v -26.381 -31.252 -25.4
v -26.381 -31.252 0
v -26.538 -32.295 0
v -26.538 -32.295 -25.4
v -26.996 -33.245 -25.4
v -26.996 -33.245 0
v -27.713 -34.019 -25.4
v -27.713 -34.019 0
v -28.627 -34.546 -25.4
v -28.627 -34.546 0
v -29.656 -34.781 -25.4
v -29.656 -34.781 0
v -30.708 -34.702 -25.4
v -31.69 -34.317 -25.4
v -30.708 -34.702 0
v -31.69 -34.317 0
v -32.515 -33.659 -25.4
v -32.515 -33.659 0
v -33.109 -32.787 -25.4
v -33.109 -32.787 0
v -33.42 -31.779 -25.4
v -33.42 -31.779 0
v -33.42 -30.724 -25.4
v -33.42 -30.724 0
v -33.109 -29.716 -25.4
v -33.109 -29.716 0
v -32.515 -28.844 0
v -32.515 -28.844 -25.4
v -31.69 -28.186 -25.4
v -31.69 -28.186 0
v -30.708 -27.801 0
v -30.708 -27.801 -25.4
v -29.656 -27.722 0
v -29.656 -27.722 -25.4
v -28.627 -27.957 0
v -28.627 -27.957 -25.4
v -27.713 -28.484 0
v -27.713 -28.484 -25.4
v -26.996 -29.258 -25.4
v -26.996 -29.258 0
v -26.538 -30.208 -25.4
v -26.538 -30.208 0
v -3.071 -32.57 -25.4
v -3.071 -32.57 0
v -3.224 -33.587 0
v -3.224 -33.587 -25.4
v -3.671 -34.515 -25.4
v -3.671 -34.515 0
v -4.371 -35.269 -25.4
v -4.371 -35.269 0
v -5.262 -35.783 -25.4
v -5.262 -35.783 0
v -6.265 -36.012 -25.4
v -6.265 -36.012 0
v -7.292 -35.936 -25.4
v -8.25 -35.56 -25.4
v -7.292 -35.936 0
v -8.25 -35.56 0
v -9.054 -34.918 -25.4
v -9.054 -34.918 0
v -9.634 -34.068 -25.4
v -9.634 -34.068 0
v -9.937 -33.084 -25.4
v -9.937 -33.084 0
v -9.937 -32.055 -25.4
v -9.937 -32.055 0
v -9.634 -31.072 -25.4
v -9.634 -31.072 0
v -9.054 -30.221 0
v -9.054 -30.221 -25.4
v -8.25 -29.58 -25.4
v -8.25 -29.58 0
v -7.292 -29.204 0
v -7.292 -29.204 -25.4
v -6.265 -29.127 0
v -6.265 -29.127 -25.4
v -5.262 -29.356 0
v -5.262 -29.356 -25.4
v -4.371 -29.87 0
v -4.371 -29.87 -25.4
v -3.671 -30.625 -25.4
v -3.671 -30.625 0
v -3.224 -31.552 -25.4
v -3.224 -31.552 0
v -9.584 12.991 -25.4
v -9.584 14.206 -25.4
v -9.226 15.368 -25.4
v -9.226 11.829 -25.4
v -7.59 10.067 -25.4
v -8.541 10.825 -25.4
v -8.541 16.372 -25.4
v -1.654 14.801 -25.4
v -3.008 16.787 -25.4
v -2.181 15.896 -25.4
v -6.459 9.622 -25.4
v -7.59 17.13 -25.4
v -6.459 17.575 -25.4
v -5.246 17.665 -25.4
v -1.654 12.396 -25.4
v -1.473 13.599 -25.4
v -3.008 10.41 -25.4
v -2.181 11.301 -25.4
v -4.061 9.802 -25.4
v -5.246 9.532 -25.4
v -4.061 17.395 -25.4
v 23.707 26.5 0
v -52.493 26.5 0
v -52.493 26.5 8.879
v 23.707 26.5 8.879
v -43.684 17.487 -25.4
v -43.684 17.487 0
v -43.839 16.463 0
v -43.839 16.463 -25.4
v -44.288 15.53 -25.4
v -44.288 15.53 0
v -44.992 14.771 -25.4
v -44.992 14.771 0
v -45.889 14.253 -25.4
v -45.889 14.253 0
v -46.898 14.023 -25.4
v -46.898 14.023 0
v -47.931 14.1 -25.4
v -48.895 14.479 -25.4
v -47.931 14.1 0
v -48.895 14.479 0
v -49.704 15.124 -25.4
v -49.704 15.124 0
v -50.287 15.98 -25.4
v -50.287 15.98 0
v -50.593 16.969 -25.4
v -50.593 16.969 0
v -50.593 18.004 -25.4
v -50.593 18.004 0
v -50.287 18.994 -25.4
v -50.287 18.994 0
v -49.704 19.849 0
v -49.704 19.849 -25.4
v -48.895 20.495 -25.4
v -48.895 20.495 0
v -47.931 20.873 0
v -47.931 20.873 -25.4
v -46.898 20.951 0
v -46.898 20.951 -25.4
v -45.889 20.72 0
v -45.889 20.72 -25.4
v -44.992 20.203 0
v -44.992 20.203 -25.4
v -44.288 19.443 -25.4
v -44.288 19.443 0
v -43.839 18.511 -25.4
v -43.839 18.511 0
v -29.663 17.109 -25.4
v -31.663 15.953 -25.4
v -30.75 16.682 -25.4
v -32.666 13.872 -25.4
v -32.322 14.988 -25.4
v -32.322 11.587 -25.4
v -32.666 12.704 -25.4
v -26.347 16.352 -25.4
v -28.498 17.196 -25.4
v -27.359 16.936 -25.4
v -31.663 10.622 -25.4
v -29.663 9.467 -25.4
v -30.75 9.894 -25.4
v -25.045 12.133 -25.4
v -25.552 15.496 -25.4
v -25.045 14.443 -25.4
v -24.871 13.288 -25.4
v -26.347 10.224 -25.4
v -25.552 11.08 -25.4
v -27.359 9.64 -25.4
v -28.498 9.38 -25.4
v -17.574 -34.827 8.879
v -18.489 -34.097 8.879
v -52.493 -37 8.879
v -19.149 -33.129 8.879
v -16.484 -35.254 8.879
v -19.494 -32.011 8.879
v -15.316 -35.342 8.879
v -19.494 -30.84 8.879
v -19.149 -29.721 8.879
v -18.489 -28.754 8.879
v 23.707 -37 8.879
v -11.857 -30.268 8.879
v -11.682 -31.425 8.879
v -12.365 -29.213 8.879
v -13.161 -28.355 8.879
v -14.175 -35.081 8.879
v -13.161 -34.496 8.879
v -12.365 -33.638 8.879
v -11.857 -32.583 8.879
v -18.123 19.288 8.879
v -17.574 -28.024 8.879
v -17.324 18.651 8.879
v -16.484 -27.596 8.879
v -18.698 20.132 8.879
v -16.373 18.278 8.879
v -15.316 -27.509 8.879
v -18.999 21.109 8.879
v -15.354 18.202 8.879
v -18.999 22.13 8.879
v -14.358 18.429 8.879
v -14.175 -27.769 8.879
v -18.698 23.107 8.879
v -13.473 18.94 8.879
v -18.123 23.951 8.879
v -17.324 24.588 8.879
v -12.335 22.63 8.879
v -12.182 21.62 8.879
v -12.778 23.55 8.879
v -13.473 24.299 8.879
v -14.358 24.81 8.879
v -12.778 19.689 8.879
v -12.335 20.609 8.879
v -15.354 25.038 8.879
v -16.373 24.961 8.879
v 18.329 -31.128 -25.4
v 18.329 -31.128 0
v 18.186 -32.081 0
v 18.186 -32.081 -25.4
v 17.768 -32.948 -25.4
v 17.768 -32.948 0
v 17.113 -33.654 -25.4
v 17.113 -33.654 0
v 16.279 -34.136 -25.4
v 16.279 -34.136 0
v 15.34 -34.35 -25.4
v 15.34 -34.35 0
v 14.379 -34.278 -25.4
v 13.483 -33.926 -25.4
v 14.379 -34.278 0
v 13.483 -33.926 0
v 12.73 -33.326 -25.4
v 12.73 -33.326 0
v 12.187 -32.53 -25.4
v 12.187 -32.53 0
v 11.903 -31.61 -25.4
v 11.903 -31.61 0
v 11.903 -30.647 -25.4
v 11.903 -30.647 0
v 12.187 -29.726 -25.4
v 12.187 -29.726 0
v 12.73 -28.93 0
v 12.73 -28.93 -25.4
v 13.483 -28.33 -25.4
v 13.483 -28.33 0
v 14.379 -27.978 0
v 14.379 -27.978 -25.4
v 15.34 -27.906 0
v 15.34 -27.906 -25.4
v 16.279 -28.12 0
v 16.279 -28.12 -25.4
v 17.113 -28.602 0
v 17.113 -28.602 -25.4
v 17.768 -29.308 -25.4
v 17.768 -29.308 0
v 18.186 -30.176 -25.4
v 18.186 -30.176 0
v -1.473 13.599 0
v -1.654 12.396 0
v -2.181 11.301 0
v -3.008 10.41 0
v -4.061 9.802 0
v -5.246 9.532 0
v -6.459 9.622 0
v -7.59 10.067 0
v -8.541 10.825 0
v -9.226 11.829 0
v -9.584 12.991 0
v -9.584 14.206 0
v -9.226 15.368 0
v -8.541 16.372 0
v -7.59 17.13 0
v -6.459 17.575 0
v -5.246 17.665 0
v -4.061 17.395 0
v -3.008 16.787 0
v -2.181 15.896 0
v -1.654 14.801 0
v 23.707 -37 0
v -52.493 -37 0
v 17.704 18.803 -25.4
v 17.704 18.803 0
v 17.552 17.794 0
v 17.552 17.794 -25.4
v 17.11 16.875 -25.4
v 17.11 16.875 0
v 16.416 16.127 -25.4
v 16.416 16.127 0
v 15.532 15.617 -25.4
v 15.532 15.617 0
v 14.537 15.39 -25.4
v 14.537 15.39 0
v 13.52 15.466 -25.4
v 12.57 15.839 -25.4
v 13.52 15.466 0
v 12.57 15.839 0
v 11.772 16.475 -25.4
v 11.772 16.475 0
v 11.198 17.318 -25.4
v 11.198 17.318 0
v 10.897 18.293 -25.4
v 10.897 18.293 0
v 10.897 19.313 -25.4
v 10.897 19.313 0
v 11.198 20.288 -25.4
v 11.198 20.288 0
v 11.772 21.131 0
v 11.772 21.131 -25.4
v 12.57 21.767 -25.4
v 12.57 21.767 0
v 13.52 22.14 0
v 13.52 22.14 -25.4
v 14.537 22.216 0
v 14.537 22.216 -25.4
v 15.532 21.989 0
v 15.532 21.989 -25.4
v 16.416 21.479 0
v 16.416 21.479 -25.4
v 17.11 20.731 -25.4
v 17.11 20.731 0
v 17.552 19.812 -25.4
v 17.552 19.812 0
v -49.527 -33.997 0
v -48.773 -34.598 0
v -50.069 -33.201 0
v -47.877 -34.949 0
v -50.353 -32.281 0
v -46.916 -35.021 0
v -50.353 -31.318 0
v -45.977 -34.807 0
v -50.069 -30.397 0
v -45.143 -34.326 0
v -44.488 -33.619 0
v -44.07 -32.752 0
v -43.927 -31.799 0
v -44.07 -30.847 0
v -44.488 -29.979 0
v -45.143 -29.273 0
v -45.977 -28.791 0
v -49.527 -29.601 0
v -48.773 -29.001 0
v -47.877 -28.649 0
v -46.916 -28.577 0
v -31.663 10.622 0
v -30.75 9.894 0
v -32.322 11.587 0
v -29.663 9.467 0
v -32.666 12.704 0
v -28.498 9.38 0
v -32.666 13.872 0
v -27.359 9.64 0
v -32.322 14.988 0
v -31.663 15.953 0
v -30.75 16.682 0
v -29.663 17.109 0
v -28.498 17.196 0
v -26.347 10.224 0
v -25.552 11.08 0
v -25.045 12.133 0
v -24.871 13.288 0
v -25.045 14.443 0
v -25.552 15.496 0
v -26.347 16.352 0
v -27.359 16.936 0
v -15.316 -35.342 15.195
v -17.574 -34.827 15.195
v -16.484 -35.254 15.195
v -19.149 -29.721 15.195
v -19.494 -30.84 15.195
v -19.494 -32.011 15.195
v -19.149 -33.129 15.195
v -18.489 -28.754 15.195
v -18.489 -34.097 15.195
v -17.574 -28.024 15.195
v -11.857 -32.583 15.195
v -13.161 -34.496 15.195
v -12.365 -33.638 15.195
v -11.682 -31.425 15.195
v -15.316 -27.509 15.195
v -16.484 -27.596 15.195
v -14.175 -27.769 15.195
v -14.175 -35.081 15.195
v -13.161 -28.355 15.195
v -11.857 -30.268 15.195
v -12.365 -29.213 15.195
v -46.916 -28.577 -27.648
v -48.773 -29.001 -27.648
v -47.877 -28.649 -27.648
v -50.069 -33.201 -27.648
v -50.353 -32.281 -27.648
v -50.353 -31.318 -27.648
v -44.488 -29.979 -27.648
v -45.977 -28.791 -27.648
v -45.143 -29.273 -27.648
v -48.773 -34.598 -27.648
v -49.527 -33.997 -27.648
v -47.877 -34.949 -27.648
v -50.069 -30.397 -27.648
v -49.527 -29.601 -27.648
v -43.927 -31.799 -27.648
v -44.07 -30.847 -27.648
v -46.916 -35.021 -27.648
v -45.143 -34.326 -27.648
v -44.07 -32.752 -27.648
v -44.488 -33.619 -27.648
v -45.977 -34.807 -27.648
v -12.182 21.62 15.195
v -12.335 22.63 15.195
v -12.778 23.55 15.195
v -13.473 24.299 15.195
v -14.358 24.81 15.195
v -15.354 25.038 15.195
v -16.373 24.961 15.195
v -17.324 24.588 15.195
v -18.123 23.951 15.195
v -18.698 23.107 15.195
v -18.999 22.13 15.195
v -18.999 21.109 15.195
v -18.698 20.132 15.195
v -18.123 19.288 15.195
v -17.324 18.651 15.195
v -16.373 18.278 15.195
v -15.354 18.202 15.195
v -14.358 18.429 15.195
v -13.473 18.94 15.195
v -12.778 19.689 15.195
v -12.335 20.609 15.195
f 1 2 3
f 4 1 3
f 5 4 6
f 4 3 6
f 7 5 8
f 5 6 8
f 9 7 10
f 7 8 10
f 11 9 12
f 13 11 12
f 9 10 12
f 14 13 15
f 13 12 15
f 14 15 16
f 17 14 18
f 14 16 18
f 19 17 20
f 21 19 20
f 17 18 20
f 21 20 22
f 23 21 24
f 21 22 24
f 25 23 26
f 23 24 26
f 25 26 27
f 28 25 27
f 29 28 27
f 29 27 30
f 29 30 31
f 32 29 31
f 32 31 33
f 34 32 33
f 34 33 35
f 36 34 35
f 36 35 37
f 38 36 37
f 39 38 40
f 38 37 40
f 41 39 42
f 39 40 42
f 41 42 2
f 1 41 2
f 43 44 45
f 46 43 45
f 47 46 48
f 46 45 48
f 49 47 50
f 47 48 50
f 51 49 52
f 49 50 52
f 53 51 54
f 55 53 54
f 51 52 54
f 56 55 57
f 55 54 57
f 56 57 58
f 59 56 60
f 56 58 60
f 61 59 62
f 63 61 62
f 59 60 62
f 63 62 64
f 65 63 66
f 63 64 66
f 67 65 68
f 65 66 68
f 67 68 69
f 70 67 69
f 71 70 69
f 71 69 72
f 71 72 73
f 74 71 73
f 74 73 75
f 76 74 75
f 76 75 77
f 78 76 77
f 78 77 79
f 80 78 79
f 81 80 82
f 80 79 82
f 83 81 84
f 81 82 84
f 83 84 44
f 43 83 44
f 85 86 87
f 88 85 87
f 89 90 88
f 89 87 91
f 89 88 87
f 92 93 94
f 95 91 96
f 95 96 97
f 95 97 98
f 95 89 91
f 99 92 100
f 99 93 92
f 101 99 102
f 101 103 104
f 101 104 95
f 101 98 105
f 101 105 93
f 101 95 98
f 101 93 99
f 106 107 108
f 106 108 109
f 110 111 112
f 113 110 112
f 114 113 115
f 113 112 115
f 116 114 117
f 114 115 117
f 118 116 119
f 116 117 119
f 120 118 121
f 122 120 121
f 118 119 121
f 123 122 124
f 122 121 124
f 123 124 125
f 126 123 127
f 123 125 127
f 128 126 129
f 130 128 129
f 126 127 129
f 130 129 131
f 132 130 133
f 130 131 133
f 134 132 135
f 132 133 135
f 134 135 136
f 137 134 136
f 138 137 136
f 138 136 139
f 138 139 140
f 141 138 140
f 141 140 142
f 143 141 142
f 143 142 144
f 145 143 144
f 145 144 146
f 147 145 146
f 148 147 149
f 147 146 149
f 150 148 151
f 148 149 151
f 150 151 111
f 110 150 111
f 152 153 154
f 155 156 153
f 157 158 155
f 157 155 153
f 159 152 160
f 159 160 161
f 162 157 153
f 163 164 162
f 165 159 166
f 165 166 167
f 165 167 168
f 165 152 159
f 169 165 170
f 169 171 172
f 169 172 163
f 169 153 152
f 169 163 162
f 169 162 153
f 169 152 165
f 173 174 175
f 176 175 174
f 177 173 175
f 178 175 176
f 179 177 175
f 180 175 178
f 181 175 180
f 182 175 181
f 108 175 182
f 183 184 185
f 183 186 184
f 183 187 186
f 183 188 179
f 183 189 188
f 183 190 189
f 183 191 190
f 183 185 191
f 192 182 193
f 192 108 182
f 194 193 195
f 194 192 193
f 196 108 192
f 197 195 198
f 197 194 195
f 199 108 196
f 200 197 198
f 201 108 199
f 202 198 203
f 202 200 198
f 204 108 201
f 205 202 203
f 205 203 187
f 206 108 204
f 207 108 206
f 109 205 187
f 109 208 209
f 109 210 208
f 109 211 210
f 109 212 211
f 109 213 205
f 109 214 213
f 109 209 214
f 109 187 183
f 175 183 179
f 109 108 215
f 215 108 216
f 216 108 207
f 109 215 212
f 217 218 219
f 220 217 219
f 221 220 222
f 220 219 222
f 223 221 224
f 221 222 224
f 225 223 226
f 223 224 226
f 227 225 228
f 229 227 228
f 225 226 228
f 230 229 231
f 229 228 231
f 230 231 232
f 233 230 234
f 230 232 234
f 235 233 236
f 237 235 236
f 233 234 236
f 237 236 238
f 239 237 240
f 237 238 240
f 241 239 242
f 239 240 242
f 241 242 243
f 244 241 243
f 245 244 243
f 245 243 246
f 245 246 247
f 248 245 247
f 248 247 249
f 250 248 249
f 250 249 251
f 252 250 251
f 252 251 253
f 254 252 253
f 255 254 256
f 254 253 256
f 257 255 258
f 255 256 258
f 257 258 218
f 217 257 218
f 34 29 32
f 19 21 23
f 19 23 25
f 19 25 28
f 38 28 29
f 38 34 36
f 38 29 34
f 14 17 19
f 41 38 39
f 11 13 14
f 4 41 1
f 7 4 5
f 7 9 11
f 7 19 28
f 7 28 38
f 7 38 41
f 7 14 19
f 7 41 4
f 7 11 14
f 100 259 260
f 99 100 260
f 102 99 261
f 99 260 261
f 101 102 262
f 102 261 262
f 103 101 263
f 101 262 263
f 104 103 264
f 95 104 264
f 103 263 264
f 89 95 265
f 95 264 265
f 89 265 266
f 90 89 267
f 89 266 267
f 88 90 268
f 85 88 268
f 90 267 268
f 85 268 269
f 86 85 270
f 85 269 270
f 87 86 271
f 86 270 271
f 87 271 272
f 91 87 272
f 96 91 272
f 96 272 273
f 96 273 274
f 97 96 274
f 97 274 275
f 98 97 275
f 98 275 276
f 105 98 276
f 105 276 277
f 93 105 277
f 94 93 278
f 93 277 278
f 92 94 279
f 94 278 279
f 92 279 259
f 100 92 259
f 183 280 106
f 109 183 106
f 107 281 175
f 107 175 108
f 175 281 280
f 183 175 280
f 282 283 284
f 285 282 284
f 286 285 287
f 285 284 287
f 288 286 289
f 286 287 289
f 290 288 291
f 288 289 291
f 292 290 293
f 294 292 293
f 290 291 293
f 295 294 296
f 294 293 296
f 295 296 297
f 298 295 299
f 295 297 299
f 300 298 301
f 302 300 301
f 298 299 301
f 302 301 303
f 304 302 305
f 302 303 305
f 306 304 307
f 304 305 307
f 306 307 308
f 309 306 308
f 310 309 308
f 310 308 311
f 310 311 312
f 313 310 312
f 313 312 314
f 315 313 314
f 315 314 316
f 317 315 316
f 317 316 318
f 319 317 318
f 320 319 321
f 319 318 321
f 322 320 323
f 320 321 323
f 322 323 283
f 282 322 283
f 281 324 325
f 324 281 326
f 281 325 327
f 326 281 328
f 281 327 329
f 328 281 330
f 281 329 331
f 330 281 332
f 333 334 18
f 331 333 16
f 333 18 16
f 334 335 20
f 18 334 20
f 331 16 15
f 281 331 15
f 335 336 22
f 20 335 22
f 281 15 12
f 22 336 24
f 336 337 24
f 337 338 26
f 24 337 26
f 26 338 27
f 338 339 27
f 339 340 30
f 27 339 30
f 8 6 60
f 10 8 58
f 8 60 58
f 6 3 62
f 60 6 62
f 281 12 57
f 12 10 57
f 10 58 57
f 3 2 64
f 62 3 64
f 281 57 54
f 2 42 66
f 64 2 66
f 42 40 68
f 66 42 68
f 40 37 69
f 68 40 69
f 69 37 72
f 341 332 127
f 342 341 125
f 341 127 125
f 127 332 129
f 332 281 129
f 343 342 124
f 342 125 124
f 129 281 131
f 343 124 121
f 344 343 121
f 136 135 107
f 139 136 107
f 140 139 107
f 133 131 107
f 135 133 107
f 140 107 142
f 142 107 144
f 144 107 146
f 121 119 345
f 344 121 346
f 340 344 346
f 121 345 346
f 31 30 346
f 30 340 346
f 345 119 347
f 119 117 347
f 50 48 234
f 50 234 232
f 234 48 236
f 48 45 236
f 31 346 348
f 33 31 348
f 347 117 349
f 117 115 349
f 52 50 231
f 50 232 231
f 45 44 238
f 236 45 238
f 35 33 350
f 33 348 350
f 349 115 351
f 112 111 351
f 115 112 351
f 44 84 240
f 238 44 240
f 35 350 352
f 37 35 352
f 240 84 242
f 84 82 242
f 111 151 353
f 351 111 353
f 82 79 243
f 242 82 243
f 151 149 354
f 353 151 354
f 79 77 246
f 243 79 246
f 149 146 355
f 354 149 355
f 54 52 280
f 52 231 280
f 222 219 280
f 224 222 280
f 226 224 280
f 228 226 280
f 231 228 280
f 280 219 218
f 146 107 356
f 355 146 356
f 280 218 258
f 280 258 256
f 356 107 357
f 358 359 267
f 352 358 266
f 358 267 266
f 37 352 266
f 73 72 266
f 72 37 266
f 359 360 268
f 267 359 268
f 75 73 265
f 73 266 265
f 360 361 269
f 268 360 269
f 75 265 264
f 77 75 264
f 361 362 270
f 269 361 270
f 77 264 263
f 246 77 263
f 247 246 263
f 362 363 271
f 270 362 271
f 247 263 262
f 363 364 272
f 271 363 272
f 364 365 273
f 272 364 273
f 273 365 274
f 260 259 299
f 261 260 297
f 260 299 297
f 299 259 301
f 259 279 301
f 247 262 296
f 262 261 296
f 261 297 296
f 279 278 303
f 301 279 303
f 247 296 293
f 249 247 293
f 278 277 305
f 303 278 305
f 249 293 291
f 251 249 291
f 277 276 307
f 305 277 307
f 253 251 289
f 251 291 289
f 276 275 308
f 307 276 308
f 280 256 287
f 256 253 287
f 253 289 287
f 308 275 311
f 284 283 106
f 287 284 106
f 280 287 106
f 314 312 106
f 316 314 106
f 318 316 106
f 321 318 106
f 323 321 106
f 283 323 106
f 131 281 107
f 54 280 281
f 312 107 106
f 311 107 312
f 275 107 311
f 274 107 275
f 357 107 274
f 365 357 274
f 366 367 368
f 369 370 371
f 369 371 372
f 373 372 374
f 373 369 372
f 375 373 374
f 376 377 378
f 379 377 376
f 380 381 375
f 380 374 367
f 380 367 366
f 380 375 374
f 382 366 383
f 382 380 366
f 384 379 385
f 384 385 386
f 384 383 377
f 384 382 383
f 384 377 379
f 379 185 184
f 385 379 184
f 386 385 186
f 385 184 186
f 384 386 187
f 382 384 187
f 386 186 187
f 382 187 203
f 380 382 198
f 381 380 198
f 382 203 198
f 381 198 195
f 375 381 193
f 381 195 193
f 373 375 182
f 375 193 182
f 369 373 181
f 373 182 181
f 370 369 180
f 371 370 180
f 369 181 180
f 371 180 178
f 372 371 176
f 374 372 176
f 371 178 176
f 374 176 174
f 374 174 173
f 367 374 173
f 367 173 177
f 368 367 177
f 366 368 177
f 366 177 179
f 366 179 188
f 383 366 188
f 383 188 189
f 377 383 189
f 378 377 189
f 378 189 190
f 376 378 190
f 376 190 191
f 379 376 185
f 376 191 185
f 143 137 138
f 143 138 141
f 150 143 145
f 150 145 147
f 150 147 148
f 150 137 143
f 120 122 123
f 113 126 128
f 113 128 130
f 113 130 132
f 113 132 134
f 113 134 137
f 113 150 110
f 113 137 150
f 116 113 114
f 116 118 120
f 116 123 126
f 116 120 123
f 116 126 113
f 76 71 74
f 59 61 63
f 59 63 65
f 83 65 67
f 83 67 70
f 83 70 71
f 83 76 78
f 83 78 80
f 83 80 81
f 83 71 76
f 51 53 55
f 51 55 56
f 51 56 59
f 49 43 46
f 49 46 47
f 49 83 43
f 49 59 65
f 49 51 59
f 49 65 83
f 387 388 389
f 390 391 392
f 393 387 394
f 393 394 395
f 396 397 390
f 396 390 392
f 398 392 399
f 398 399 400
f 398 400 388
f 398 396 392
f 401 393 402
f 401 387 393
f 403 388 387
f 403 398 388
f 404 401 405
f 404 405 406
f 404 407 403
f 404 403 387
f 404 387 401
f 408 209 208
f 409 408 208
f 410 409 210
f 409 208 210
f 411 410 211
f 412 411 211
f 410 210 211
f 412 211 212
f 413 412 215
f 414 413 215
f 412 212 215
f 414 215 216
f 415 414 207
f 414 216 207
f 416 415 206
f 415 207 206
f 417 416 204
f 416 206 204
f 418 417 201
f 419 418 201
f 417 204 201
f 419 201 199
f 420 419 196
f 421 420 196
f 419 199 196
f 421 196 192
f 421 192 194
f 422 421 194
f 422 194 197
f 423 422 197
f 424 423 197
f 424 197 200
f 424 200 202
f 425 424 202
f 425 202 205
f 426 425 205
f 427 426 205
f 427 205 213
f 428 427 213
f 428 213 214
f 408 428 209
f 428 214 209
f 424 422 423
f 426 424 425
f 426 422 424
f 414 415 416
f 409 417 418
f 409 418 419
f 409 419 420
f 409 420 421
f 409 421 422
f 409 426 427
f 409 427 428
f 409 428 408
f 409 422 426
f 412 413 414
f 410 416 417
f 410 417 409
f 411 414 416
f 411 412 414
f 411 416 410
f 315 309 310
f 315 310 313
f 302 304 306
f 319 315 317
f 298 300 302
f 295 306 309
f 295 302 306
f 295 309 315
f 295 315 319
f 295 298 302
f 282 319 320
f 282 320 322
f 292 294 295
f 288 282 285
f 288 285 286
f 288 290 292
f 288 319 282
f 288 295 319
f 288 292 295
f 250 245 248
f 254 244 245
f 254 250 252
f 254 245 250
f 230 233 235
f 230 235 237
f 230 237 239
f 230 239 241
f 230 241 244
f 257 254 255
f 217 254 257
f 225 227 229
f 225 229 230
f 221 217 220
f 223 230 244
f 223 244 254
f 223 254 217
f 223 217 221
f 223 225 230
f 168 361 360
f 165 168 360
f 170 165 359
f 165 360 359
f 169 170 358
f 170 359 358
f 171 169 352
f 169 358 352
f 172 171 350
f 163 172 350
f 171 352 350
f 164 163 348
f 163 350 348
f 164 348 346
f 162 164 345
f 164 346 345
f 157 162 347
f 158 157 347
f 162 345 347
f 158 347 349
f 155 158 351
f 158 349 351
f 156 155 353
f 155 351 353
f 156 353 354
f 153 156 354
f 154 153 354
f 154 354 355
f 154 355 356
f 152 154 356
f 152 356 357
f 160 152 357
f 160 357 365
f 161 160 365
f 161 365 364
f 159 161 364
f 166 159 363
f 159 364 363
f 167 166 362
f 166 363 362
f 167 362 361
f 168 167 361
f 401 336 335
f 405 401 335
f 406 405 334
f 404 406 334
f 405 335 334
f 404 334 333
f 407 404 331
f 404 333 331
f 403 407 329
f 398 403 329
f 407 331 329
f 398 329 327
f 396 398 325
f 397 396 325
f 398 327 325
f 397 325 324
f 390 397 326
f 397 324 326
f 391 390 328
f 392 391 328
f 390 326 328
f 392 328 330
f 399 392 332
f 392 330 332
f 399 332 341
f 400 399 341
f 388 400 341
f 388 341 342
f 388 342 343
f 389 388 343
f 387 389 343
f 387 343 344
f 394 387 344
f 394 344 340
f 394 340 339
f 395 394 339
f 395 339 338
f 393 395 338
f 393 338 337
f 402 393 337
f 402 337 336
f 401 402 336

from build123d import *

# Parameters (mm, degrees)
F0_W      = 76.2
F0_H      = 63.5
F1_DEPTH  = 8.87915
F2_R      = 3.2312727432
F3_DEPTH  = 27.64789
F2_R_2    = 3.4736024705
F2_R_3    = 3.4228960701
F2_R_4    = 3.2312730123
F4_DEPTH  = 25.4
F5_R      = 3.9275858197
F5_R_2    = 3.4275613836
F6_DEPTH  = 6.31556
F9_R      = 4.0783648595
F9_R_2    = 3.9191806832
F9_R_3    = 3.5394300608
F9_R_4    = 3.4524766022
F10_DEPTH = 25.4


# Not quite as in the source:
# - the program builds the solid bodies; features that only make, move or delete a surface that nothing else refers to are left out


with BuildPart() as f1:
    # F0 (on Top) → F1 (new body)
    with BuildSketch(Plane.XY):
        with Locations((-14.3929980695, -5.2504202625)):
            Rectangle(F0_W, F0_H)
    extrude(amount=F1_DEPTH)

    # F2 (on face) → F3 (join)
    with BuildSketch(Plane(origin=(0, 0, 0), x_dir=(1, 0, 0), z_dir=(0, 0, -1))):
        with Locations((-47.1578612924, 31.7992158234)):
            Circle(F2_R)
    extrude(amount=F3_DEPTH)

    # F2 (on face) → F4 (join)
    with BuildSketch(Plane(origin=(0, 0, 0), x_dir=(1, 0, 0), z_dir=(0, 0, -1))):
        with Locations((-47.1578612924, 31.7992158234)):
            Circle(F2_R)
        with Locations((-47.1578612924, -17.4867473543)):
            Circle(F2_R_2)
        with Locations((14.2814768478, -18.8030768186)):
            Circle(F2_R_3)
        with Locations((15.0982076302, 31.1281010509)):
            Circle(F2_R_4)
    extrude(amount=F4_DEPTH)

    # F5 (on face) → F6 (join)
    with BuildSketch(Plane.XY.offset(8.87915)):
        with Locations((-15.6099880114, -31.4252711833)):
            Circle(F5_R)
        with Locations((-15.6099880114, 21.6196272522)):
            Circle(F5_R_2)
    extrude(amount=F6_DEPTH)

    # F9 (on face) → F10 (join)
    with BuildSketch(Plane(origin=(0, 0, 0), x_dir=(1, 0, 0), z_dir=(0, 0, -1))):
        with Locations((-5.5510420352, -13.5985026136)):
            Circle(F9_R)
        with Locations((-28.7904683501, -13.2877733558)):
            Circle(F9_R_2)
        with Locations((-29.9201626331, 31.2515720725)):
            Circle(F9_R_3)
        with Locations((-6.5234871581, 32.5696654618)):
            Circle(F9_R_4)
    extrude(amount=F10_DEPTH)


solid = f1.part
